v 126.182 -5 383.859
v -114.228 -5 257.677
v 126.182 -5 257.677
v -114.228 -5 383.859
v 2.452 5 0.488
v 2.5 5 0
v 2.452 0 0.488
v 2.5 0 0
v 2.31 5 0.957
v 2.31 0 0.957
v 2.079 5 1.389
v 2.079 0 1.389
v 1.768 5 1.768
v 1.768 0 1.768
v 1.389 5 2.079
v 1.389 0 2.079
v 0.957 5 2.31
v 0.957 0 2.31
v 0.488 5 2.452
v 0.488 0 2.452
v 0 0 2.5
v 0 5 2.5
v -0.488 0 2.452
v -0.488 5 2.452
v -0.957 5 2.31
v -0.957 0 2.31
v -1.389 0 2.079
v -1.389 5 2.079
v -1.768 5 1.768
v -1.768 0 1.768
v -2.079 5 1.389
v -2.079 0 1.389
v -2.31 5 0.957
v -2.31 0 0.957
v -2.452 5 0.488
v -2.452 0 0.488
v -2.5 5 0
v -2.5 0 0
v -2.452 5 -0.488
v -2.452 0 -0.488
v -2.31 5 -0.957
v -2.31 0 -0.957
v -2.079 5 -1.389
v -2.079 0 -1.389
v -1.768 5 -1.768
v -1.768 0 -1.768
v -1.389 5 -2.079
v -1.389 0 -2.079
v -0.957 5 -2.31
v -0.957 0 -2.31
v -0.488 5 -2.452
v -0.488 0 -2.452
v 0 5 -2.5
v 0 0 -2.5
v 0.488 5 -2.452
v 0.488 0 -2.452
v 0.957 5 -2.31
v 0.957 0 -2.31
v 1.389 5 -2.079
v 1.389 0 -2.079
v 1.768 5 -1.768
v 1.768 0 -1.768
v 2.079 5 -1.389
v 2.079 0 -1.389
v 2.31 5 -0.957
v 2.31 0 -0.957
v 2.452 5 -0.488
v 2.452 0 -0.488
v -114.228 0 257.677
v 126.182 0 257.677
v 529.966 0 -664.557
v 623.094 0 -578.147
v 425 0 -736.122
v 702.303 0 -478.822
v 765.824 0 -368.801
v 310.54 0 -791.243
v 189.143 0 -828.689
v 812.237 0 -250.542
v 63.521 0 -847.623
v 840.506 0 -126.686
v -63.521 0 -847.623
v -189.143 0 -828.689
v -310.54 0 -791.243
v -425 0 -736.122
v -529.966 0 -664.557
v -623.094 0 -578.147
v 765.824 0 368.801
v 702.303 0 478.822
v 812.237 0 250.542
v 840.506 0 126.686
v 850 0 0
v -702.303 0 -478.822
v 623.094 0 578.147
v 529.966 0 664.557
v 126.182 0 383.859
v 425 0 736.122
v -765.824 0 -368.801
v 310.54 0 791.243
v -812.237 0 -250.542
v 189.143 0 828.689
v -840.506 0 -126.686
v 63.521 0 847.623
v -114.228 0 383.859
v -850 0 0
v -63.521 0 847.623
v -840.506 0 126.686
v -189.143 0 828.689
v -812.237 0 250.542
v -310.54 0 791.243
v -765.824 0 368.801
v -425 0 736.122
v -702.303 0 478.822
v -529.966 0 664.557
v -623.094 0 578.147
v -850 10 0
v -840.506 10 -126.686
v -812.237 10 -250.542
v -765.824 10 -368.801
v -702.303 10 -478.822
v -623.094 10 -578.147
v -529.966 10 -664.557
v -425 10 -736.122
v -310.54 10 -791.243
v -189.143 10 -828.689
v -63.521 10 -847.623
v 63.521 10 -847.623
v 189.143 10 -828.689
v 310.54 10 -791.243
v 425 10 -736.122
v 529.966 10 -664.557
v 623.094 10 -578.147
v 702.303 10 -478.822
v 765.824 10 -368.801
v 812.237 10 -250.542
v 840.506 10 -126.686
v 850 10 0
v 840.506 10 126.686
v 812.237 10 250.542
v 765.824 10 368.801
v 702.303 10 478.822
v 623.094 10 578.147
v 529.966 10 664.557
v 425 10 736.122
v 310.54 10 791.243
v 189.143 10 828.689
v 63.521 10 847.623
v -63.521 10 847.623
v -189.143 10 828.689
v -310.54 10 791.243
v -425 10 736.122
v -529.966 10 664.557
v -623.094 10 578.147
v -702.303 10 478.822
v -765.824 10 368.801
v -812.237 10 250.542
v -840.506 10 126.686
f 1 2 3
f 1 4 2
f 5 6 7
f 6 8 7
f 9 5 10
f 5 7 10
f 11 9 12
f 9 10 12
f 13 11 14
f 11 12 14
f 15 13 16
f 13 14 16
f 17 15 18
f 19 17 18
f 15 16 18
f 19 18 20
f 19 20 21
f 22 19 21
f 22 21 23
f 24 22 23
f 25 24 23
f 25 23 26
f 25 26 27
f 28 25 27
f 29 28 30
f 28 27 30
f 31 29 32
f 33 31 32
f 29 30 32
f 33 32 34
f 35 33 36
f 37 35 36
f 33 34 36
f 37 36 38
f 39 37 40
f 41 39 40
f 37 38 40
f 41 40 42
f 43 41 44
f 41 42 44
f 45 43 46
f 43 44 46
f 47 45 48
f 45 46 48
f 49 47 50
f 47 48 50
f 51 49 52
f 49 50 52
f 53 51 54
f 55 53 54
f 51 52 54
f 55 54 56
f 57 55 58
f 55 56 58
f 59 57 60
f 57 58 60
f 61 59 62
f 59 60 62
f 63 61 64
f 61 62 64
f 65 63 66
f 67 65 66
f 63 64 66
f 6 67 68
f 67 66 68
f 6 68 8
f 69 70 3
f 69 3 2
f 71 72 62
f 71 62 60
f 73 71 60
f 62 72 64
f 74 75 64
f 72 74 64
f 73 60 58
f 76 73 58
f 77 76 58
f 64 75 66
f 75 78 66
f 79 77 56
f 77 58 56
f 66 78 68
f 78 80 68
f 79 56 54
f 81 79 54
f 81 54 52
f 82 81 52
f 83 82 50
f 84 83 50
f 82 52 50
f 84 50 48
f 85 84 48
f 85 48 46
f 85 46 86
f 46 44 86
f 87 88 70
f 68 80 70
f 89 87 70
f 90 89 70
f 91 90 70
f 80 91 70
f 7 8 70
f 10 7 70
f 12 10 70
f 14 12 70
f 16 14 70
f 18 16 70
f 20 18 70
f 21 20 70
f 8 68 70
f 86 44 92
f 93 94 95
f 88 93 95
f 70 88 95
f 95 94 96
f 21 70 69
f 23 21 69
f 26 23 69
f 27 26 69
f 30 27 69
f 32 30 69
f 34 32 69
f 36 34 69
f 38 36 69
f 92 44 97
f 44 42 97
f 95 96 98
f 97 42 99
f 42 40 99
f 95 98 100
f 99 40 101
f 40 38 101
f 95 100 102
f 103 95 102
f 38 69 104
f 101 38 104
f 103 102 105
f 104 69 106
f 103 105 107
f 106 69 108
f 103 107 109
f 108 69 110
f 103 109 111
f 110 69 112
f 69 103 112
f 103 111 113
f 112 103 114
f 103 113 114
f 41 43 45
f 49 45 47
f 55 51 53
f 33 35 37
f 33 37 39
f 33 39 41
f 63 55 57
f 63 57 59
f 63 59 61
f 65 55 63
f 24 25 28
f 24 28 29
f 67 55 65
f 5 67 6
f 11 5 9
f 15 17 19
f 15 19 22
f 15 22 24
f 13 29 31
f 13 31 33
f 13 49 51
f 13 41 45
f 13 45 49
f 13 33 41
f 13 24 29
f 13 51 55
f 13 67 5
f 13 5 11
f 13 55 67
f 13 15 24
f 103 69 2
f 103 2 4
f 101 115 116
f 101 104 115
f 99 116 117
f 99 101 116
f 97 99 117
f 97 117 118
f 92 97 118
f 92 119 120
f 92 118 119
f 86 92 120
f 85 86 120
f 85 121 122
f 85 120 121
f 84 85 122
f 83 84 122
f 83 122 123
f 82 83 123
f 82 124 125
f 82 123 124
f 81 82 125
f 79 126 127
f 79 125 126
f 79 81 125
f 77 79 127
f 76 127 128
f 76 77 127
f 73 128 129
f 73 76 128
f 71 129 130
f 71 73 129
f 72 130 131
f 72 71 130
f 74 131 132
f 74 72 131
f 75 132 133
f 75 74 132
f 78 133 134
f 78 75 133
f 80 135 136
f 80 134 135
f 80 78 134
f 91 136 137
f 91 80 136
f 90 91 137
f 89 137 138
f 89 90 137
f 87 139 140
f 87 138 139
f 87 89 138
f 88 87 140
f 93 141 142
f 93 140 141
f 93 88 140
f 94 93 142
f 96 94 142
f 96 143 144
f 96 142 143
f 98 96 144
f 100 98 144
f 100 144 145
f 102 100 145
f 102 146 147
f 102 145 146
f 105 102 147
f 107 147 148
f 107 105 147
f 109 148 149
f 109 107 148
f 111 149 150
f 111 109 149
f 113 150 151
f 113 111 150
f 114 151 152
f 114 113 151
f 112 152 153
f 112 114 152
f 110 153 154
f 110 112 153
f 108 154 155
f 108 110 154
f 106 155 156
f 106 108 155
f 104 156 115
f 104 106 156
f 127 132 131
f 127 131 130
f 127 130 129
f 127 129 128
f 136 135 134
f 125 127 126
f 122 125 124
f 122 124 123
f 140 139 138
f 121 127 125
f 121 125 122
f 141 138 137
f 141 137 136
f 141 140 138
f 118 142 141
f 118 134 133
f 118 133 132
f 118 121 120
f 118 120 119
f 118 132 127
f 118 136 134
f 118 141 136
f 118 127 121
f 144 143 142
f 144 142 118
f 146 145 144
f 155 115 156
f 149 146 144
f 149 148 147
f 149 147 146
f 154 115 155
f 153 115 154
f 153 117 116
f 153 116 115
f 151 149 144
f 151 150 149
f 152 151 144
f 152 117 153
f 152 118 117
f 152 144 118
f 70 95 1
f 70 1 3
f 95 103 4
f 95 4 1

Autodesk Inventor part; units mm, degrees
ref_plane "YZ Plane" through (0, 0, 0) normal (1, 0, 0) x (0, 1, 0)
ref_plane "XZ Plane" through (0, 0, 0) normal (0, 1, 0) x (-1, 0, 0)
ref_plane "XY Plane" through (0, 0, 0) normal (0, 0, 1) x (1, 0, 0)
sketch "Sketch1" plane through (0, 0, 0) normal (0, 1, 0) x (-1, 0, 0)
  circle A0 centre (0, 0) radius 850
  dimension "d0" = 1700
extrude "Extrusion1" add sketch "Sketch1" along normal blind 10
sketch "Sketch2" plane through (0, 0, 0) normal (0, -1, 0) x (1, 0, 0)
  circle A0 centre (0, 0) radius 2.5
  dimension "d3" = 5
extrude "Extrusion2" cut sketch "Sketch2" against normal blind 5
sketch "Sketch3" plane through (0, 0, 0) normal (0, -1, 0) x (1, 0, 0)
  line L0 (-114.2279, 383.8588) -> (126.182, 383.8588)
  line L1 (126.182, 383.8588) -> (126.182, 257.6769)
  line L2 (126.182, 257.6769) -> (-114.2279, 257.6769)
  line L3 (-114.2279, 257.6769) -> (-114.2279, 383.8588)
  point P0 (0, 0)
extrude "Extrusion3" add sketch "Sketch3" along normal blind 5
properties part number "McCrea_ukruhlaPlocha_walle" material "Rubber"
